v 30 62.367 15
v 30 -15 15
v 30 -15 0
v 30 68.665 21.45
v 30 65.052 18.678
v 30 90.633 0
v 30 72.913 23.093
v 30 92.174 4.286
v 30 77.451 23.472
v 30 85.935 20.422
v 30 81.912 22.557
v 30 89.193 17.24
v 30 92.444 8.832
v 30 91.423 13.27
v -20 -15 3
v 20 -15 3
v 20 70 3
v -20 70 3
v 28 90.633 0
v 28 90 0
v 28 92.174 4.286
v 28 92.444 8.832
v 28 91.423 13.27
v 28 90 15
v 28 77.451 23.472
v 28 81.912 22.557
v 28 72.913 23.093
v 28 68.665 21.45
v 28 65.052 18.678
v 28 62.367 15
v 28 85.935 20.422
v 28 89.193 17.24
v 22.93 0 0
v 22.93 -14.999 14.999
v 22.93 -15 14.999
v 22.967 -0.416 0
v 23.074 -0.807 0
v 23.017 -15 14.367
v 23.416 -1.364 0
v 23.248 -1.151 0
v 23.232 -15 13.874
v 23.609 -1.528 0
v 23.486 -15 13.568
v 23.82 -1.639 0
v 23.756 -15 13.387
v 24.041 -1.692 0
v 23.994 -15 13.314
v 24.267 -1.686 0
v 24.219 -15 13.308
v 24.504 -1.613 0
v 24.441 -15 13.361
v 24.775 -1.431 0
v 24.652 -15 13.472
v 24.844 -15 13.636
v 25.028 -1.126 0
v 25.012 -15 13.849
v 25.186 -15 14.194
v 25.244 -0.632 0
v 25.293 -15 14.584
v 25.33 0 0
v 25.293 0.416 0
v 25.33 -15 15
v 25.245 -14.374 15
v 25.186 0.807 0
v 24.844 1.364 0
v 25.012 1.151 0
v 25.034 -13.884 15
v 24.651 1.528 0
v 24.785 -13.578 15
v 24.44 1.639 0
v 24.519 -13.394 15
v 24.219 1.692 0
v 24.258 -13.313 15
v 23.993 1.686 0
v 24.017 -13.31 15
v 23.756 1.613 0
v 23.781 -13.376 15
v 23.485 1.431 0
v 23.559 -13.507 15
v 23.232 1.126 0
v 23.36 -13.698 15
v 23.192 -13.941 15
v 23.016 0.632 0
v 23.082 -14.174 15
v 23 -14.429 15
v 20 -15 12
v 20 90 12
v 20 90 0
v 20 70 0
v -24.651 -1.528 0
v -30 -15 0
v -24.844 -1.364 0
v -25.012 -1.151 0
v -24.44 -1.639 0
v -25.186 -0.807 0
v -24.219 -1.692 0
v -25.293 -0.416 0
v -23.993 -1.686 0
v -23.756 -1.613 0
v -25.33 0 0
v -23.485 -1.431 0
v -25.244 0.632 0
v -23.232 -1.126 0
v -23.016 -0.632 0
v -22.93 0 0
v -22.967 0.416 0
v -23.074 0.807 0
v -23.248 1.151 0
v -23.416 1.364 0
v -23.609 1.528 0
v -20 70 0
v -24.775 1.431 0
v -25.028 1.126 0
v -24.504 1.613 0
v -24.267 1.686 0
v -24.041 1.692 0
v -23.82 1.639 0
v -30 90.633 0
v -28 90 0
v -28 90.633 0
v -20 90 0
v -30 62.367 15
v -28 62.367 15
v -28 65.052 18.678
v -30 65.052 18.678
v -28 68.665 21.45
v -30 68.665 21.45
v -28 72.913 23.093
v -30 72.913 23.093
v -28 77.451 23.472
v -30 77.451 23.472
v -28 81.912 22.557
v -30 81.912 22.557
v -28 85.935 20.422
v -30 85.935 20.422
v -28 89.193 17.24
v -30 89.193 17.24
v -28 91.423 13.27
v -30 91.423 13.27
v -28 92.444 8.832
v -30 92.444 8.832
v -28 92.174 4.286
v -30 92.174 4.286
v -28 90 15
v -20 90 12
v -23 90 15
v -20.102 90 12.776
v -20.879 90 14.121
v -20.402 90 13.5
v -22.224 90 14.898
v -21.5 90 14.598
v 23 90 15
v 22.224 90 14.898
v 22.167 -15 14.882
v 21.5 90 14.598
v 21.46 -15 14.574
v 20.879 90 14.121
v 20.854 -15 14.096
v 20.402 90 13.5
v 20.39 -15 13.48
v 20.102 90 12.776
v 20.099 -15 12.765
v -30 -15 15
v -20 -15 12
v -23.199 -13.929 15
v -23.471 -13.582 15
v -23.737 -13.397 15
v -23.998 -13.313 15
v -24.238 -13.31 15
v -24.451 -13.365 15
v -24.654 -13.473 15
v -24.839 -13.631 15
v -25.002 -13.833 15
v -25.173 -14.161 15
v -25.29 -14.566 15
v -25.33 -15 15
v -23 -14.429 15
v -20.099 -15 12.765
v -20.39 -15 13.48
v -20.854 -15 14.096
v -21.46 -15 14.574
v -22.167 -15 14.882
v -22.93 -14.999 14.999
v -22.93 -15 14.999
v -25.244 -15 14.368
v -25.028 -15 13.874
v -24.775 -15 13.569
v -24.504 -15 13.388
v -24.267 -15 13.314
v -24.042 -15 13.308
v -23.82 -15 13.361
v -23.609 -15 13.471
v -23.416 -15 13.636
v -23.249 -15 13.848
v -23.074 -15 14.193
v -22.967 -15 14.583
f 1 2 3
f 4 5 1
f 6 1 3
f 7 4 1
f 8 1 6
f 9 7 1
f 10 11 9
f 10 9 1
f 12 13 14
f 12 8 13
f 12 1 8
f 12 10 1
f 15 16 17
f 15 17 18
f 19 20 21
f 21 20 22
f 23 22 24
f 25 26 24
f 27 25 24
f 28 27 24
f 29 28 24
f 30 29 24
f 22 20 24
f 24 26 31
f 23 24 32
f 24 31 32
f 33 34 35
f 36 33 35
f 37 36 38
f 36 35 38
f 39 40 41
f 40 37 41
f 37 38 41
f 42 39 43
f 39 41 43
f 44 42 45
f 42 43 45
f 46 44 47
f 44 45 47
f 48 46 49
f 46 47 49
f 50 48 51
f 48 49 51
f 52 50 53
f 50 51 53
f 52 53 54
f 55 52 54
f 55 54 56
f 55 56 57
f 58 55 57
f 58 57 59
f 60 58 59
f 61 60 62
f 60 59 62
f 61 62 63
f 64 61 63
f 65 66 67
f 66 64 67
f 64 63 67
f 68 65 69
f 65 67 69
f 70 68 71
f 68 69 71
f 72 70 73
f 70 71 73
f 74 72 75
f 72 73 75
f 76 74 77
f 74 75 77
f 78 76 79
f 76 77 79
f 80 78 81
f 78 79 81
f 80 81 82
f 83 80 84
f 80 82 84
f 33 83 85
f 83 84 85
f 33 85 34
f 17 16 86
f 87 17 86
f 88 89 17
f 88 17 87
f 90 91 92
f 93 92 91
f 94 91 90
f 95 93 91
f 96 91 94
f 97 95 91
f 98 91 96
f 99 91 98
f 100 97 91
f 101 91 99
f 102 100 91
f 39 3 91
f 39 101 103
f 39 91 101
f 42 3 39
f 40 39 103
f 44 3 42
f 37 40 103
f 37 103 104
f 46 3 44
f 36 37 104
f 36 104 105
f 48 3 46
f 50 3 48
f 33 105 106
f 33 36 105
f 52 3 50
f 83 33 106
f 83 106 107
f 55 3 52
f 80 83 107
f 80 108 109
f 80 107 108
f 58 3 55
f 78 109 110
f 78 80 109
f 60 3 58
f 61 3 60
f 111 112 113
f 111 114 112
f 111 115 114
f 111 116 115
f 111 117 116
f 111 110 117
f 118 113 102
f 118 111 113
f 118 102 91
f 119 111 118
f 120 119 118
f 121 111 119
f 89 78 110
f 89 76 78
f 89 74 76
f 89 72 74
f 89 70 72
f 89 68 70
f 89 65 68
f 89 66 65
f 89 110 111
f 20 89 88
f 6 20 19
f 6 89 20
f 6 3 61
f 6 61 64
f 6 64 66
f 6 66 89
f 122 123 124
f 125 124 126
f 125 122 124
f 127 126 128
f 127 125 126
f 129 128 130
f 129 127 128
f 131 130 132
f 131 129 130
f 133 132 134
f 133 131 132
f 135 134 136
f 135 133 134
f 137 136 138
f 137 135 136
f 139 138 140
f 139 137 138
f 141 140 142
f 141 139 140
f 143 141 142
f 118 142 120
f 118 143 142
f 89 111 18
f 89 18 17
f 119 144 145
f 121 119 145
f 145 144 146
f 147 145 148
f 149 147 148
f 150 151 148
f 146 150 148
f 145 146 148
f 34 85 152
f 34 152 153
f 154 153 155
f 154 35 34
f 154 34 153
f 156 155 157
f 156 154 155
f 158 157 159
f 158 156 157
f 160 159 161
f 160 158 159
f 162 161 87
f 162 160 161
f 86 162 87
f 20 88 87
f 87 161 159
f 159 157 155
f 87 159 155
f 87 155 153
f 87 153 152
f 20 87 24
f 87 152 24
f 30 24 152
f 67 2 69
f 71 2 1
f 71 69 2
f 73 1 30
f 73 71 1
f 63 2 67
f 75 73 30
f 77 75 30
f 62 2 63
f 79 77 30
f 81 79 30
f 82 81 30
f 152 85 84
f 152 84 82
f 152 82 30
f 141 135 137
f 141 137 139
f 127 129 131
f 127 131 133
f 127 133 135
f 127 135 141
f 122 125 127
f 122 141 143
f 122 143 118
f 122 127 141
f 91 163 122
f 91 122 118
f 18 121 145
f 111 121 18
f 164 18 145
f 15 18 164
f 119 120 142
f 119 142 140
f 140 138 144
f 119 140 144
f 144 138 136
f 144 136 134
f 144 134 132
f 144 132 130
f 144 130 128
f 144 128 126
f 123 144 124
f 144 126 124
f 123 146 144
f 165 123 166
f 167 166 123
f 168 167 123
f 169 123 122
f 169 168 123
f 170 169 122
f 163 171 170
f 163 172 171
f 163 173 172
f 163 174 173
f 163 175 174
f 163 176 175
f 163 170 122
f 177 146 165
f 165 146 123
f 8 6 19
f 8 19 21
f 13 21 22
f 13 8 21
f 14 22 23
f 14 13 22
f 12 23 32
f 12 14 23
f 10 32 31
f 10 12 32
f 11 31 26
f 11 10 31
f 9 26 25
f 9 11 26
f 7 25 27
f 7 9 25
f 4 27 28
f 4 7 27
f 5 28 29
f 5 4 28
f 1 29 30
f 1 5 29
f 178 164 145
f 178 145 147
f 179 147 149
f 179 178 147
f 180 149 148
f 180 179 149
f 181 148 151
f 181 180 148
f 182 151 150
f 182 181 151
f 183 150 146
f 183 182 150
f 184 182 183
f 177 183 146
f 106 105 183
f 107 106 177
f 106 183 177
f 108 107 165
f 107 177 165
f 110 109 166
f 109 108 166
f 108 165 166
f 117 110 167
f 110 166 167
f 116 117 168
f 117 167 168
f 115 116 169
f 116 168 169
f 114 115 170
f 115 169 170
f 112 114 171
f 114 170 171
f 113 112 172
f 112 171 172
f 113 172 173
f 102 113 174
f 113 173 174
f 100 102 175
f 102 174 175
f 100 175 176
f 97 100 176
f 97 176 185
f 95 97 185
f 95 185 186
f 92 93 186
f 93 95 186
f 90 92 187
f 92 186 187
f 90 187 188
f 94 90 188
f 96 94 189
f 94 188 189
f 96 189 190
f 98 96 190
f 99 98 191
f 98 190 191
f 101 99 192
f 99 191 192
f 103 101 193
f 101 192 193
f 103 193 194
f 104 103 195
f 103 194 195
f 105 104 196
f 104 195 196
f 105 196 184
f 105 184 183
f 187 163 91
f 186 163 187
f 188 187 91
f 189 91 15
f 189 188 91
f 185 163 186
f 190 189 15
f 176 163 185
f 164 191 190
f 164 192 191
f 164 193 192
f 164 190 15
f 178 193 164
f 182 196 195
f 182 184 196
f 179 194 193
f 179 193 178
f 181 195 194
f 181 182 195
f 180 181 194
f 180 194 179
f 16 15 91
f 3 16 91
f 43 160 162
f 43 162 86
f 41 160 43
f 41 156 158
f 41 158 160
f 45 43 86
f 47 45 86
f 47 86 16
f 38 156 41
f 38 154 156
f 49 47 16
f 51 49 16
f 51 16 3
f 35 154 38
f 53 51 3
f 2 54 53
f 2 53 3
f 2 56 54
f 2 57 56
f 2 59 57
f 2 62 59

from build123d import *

# Parameters (mm, degrees)
F2_DEPTH       = 100
F2_DEPTH_BACK  = 20
F1_R           = 1
F4_DEPTH       = 15
F4_DEPTH_BACK  = 90
F6_R           = 16
F7_DEPTH       = 2
F8_R           = 16
F9_DEPTH       = 2
F11_DEPTH      = 10
F12_R          = 1.2
F13_DEPTH      = 124.25
F13_DEPTH_BACK = 109.5
F14_W          = 125.272244215
F14_H          = 20.9059882909
F15_DEPTH      = 40


with BuildPart() as f2:
    # F1 (on face) → F2 (new body, two sides)
    with BuildSketch(Plane(origin=(0, 0, 0), x_dir=(1, 0, 0), z_dir=(0, -0.7071067812, 0.7071067812))) as f2_sk:
        with BuildLine():
            ThreePointArc((25.13, 0), (24.13, 1), (23.13, 0))
            ThreePointArc((23.13, 0), (24.13, -1), (25.13, 0))
        make_face()
    extrude(amount=F2_DEPTH)
    extrude(f2_sk.sketch, amount=-F2_DEPTH_BACK)



with BuildPart() as f2b:
    # F1 (on face) → F2, piece 2 (new body, two sides)
    with BuildSketch(Plane(origin=(0, 0, 0), x_dir=(1, 0, 0), z_dir=(0, -0.7071067812, 0.7071067812))) as f2_2_sk:
        with Locations((-24.13, 0)):
            Circle(F1_R)
    extrude(amount=F2_DEPTH)
    extrude(f2_2_sk.sketch, amount=-F2_DEPTH_BACK)


with BuildPart() as f2_1:
    add(f2.part)

    add(f2b.part)  # F4 merges F2b
    # F3 (on Front) → F4 (join, two sides)
    with BuildSketch(Plane.XZ) as f4_sk:
        with BuildLine():
            Line((-30, 15), (-30, 0))
            Line((-30, 0), (30, 0))
            Line((30, 0), (30, 15))
            Line((30, 15), (23, 15))
            ThreePointArc((23, 15), (20.8786796564, 14.1213203436), (20, 12))
            Line((20, 12), (20, 3))
            Line((20, 3), (-20, 3))
            Line((-20, 3), (-20, 12))
            ThreePointArc((-20, 12), (-20.8786796564, 14.1213203436), (-23, 15))
            Line((-23, 15), (-30, 15))
        make_face()
    extrude(amount=F4_DEPTH)
    extrude(f4_sk.sketch, amount=-F4_DEPTH_BACK)

    # F6 (on face) → F7 (join)
    with BuildSketch(Plane(origin=(-30, 0, 0), x_dir=(0, -1, 0), z_dir=(-1, 0, 0))):
        with Locations((-76.5, 7.5)):
            Circle(F6_R)
    extrude(amount=-F7_DEPTH)

    # F8 (on face) → F9 (join)
    with BuildSketch(Plane.YZ.offset(30)):
        with Locations((76.5, 7.5)):
            Circle(F8_R)
    extrude(amount=-F9_DEPTH)

    # F10 (on Top) → F11 (cut)
    with BuildSketch(Plane.XY):
        Polygon((20, 90), (-20, 90), (-20, 77.4333529874), (-20, 70), (20, 70), align=None)
    extrude(amount=F11_DEPTH, mode=Mode.SUBTRACT)

    # F12 (on face) → F13 (cut, two sides)
    with BuildSketch(Plane(origin=(0, 0, 0), x_dir=(1, 0, 0), z_dir=(0, -0.7071067812, 0.7071067812))) as f13_sk:
        with BuildLine():
            ThreePointArc((25.33, 0), (24.13, 1.2), (22.93, 0))
            ThreePointArc((22.93, 0), (24.13, -1.2), (25.33, 0))
        make_face()
        with Locations((-24.13, 0)):
            Circle(F12_R)
    extrude(amount=F13_DEPTH, mode=Mode.SUBTRACT)
    extrude(f13_sk.sketch, amount=-F13_DEPTH_BACK, mode=Mode.SUBTRACT)

    # F14 (on Right) → F15 (cut, symmetric)
    with BuildSketch(Plane.YZ):
        with Locations((62.6361221075, -10.4529941455)):
            Rectangle(F14_W, F14_H)
    extrude(amount=F15_DEPTH, both=True, mode=Mode.SUBTRACT)


solid = f2_1.part
